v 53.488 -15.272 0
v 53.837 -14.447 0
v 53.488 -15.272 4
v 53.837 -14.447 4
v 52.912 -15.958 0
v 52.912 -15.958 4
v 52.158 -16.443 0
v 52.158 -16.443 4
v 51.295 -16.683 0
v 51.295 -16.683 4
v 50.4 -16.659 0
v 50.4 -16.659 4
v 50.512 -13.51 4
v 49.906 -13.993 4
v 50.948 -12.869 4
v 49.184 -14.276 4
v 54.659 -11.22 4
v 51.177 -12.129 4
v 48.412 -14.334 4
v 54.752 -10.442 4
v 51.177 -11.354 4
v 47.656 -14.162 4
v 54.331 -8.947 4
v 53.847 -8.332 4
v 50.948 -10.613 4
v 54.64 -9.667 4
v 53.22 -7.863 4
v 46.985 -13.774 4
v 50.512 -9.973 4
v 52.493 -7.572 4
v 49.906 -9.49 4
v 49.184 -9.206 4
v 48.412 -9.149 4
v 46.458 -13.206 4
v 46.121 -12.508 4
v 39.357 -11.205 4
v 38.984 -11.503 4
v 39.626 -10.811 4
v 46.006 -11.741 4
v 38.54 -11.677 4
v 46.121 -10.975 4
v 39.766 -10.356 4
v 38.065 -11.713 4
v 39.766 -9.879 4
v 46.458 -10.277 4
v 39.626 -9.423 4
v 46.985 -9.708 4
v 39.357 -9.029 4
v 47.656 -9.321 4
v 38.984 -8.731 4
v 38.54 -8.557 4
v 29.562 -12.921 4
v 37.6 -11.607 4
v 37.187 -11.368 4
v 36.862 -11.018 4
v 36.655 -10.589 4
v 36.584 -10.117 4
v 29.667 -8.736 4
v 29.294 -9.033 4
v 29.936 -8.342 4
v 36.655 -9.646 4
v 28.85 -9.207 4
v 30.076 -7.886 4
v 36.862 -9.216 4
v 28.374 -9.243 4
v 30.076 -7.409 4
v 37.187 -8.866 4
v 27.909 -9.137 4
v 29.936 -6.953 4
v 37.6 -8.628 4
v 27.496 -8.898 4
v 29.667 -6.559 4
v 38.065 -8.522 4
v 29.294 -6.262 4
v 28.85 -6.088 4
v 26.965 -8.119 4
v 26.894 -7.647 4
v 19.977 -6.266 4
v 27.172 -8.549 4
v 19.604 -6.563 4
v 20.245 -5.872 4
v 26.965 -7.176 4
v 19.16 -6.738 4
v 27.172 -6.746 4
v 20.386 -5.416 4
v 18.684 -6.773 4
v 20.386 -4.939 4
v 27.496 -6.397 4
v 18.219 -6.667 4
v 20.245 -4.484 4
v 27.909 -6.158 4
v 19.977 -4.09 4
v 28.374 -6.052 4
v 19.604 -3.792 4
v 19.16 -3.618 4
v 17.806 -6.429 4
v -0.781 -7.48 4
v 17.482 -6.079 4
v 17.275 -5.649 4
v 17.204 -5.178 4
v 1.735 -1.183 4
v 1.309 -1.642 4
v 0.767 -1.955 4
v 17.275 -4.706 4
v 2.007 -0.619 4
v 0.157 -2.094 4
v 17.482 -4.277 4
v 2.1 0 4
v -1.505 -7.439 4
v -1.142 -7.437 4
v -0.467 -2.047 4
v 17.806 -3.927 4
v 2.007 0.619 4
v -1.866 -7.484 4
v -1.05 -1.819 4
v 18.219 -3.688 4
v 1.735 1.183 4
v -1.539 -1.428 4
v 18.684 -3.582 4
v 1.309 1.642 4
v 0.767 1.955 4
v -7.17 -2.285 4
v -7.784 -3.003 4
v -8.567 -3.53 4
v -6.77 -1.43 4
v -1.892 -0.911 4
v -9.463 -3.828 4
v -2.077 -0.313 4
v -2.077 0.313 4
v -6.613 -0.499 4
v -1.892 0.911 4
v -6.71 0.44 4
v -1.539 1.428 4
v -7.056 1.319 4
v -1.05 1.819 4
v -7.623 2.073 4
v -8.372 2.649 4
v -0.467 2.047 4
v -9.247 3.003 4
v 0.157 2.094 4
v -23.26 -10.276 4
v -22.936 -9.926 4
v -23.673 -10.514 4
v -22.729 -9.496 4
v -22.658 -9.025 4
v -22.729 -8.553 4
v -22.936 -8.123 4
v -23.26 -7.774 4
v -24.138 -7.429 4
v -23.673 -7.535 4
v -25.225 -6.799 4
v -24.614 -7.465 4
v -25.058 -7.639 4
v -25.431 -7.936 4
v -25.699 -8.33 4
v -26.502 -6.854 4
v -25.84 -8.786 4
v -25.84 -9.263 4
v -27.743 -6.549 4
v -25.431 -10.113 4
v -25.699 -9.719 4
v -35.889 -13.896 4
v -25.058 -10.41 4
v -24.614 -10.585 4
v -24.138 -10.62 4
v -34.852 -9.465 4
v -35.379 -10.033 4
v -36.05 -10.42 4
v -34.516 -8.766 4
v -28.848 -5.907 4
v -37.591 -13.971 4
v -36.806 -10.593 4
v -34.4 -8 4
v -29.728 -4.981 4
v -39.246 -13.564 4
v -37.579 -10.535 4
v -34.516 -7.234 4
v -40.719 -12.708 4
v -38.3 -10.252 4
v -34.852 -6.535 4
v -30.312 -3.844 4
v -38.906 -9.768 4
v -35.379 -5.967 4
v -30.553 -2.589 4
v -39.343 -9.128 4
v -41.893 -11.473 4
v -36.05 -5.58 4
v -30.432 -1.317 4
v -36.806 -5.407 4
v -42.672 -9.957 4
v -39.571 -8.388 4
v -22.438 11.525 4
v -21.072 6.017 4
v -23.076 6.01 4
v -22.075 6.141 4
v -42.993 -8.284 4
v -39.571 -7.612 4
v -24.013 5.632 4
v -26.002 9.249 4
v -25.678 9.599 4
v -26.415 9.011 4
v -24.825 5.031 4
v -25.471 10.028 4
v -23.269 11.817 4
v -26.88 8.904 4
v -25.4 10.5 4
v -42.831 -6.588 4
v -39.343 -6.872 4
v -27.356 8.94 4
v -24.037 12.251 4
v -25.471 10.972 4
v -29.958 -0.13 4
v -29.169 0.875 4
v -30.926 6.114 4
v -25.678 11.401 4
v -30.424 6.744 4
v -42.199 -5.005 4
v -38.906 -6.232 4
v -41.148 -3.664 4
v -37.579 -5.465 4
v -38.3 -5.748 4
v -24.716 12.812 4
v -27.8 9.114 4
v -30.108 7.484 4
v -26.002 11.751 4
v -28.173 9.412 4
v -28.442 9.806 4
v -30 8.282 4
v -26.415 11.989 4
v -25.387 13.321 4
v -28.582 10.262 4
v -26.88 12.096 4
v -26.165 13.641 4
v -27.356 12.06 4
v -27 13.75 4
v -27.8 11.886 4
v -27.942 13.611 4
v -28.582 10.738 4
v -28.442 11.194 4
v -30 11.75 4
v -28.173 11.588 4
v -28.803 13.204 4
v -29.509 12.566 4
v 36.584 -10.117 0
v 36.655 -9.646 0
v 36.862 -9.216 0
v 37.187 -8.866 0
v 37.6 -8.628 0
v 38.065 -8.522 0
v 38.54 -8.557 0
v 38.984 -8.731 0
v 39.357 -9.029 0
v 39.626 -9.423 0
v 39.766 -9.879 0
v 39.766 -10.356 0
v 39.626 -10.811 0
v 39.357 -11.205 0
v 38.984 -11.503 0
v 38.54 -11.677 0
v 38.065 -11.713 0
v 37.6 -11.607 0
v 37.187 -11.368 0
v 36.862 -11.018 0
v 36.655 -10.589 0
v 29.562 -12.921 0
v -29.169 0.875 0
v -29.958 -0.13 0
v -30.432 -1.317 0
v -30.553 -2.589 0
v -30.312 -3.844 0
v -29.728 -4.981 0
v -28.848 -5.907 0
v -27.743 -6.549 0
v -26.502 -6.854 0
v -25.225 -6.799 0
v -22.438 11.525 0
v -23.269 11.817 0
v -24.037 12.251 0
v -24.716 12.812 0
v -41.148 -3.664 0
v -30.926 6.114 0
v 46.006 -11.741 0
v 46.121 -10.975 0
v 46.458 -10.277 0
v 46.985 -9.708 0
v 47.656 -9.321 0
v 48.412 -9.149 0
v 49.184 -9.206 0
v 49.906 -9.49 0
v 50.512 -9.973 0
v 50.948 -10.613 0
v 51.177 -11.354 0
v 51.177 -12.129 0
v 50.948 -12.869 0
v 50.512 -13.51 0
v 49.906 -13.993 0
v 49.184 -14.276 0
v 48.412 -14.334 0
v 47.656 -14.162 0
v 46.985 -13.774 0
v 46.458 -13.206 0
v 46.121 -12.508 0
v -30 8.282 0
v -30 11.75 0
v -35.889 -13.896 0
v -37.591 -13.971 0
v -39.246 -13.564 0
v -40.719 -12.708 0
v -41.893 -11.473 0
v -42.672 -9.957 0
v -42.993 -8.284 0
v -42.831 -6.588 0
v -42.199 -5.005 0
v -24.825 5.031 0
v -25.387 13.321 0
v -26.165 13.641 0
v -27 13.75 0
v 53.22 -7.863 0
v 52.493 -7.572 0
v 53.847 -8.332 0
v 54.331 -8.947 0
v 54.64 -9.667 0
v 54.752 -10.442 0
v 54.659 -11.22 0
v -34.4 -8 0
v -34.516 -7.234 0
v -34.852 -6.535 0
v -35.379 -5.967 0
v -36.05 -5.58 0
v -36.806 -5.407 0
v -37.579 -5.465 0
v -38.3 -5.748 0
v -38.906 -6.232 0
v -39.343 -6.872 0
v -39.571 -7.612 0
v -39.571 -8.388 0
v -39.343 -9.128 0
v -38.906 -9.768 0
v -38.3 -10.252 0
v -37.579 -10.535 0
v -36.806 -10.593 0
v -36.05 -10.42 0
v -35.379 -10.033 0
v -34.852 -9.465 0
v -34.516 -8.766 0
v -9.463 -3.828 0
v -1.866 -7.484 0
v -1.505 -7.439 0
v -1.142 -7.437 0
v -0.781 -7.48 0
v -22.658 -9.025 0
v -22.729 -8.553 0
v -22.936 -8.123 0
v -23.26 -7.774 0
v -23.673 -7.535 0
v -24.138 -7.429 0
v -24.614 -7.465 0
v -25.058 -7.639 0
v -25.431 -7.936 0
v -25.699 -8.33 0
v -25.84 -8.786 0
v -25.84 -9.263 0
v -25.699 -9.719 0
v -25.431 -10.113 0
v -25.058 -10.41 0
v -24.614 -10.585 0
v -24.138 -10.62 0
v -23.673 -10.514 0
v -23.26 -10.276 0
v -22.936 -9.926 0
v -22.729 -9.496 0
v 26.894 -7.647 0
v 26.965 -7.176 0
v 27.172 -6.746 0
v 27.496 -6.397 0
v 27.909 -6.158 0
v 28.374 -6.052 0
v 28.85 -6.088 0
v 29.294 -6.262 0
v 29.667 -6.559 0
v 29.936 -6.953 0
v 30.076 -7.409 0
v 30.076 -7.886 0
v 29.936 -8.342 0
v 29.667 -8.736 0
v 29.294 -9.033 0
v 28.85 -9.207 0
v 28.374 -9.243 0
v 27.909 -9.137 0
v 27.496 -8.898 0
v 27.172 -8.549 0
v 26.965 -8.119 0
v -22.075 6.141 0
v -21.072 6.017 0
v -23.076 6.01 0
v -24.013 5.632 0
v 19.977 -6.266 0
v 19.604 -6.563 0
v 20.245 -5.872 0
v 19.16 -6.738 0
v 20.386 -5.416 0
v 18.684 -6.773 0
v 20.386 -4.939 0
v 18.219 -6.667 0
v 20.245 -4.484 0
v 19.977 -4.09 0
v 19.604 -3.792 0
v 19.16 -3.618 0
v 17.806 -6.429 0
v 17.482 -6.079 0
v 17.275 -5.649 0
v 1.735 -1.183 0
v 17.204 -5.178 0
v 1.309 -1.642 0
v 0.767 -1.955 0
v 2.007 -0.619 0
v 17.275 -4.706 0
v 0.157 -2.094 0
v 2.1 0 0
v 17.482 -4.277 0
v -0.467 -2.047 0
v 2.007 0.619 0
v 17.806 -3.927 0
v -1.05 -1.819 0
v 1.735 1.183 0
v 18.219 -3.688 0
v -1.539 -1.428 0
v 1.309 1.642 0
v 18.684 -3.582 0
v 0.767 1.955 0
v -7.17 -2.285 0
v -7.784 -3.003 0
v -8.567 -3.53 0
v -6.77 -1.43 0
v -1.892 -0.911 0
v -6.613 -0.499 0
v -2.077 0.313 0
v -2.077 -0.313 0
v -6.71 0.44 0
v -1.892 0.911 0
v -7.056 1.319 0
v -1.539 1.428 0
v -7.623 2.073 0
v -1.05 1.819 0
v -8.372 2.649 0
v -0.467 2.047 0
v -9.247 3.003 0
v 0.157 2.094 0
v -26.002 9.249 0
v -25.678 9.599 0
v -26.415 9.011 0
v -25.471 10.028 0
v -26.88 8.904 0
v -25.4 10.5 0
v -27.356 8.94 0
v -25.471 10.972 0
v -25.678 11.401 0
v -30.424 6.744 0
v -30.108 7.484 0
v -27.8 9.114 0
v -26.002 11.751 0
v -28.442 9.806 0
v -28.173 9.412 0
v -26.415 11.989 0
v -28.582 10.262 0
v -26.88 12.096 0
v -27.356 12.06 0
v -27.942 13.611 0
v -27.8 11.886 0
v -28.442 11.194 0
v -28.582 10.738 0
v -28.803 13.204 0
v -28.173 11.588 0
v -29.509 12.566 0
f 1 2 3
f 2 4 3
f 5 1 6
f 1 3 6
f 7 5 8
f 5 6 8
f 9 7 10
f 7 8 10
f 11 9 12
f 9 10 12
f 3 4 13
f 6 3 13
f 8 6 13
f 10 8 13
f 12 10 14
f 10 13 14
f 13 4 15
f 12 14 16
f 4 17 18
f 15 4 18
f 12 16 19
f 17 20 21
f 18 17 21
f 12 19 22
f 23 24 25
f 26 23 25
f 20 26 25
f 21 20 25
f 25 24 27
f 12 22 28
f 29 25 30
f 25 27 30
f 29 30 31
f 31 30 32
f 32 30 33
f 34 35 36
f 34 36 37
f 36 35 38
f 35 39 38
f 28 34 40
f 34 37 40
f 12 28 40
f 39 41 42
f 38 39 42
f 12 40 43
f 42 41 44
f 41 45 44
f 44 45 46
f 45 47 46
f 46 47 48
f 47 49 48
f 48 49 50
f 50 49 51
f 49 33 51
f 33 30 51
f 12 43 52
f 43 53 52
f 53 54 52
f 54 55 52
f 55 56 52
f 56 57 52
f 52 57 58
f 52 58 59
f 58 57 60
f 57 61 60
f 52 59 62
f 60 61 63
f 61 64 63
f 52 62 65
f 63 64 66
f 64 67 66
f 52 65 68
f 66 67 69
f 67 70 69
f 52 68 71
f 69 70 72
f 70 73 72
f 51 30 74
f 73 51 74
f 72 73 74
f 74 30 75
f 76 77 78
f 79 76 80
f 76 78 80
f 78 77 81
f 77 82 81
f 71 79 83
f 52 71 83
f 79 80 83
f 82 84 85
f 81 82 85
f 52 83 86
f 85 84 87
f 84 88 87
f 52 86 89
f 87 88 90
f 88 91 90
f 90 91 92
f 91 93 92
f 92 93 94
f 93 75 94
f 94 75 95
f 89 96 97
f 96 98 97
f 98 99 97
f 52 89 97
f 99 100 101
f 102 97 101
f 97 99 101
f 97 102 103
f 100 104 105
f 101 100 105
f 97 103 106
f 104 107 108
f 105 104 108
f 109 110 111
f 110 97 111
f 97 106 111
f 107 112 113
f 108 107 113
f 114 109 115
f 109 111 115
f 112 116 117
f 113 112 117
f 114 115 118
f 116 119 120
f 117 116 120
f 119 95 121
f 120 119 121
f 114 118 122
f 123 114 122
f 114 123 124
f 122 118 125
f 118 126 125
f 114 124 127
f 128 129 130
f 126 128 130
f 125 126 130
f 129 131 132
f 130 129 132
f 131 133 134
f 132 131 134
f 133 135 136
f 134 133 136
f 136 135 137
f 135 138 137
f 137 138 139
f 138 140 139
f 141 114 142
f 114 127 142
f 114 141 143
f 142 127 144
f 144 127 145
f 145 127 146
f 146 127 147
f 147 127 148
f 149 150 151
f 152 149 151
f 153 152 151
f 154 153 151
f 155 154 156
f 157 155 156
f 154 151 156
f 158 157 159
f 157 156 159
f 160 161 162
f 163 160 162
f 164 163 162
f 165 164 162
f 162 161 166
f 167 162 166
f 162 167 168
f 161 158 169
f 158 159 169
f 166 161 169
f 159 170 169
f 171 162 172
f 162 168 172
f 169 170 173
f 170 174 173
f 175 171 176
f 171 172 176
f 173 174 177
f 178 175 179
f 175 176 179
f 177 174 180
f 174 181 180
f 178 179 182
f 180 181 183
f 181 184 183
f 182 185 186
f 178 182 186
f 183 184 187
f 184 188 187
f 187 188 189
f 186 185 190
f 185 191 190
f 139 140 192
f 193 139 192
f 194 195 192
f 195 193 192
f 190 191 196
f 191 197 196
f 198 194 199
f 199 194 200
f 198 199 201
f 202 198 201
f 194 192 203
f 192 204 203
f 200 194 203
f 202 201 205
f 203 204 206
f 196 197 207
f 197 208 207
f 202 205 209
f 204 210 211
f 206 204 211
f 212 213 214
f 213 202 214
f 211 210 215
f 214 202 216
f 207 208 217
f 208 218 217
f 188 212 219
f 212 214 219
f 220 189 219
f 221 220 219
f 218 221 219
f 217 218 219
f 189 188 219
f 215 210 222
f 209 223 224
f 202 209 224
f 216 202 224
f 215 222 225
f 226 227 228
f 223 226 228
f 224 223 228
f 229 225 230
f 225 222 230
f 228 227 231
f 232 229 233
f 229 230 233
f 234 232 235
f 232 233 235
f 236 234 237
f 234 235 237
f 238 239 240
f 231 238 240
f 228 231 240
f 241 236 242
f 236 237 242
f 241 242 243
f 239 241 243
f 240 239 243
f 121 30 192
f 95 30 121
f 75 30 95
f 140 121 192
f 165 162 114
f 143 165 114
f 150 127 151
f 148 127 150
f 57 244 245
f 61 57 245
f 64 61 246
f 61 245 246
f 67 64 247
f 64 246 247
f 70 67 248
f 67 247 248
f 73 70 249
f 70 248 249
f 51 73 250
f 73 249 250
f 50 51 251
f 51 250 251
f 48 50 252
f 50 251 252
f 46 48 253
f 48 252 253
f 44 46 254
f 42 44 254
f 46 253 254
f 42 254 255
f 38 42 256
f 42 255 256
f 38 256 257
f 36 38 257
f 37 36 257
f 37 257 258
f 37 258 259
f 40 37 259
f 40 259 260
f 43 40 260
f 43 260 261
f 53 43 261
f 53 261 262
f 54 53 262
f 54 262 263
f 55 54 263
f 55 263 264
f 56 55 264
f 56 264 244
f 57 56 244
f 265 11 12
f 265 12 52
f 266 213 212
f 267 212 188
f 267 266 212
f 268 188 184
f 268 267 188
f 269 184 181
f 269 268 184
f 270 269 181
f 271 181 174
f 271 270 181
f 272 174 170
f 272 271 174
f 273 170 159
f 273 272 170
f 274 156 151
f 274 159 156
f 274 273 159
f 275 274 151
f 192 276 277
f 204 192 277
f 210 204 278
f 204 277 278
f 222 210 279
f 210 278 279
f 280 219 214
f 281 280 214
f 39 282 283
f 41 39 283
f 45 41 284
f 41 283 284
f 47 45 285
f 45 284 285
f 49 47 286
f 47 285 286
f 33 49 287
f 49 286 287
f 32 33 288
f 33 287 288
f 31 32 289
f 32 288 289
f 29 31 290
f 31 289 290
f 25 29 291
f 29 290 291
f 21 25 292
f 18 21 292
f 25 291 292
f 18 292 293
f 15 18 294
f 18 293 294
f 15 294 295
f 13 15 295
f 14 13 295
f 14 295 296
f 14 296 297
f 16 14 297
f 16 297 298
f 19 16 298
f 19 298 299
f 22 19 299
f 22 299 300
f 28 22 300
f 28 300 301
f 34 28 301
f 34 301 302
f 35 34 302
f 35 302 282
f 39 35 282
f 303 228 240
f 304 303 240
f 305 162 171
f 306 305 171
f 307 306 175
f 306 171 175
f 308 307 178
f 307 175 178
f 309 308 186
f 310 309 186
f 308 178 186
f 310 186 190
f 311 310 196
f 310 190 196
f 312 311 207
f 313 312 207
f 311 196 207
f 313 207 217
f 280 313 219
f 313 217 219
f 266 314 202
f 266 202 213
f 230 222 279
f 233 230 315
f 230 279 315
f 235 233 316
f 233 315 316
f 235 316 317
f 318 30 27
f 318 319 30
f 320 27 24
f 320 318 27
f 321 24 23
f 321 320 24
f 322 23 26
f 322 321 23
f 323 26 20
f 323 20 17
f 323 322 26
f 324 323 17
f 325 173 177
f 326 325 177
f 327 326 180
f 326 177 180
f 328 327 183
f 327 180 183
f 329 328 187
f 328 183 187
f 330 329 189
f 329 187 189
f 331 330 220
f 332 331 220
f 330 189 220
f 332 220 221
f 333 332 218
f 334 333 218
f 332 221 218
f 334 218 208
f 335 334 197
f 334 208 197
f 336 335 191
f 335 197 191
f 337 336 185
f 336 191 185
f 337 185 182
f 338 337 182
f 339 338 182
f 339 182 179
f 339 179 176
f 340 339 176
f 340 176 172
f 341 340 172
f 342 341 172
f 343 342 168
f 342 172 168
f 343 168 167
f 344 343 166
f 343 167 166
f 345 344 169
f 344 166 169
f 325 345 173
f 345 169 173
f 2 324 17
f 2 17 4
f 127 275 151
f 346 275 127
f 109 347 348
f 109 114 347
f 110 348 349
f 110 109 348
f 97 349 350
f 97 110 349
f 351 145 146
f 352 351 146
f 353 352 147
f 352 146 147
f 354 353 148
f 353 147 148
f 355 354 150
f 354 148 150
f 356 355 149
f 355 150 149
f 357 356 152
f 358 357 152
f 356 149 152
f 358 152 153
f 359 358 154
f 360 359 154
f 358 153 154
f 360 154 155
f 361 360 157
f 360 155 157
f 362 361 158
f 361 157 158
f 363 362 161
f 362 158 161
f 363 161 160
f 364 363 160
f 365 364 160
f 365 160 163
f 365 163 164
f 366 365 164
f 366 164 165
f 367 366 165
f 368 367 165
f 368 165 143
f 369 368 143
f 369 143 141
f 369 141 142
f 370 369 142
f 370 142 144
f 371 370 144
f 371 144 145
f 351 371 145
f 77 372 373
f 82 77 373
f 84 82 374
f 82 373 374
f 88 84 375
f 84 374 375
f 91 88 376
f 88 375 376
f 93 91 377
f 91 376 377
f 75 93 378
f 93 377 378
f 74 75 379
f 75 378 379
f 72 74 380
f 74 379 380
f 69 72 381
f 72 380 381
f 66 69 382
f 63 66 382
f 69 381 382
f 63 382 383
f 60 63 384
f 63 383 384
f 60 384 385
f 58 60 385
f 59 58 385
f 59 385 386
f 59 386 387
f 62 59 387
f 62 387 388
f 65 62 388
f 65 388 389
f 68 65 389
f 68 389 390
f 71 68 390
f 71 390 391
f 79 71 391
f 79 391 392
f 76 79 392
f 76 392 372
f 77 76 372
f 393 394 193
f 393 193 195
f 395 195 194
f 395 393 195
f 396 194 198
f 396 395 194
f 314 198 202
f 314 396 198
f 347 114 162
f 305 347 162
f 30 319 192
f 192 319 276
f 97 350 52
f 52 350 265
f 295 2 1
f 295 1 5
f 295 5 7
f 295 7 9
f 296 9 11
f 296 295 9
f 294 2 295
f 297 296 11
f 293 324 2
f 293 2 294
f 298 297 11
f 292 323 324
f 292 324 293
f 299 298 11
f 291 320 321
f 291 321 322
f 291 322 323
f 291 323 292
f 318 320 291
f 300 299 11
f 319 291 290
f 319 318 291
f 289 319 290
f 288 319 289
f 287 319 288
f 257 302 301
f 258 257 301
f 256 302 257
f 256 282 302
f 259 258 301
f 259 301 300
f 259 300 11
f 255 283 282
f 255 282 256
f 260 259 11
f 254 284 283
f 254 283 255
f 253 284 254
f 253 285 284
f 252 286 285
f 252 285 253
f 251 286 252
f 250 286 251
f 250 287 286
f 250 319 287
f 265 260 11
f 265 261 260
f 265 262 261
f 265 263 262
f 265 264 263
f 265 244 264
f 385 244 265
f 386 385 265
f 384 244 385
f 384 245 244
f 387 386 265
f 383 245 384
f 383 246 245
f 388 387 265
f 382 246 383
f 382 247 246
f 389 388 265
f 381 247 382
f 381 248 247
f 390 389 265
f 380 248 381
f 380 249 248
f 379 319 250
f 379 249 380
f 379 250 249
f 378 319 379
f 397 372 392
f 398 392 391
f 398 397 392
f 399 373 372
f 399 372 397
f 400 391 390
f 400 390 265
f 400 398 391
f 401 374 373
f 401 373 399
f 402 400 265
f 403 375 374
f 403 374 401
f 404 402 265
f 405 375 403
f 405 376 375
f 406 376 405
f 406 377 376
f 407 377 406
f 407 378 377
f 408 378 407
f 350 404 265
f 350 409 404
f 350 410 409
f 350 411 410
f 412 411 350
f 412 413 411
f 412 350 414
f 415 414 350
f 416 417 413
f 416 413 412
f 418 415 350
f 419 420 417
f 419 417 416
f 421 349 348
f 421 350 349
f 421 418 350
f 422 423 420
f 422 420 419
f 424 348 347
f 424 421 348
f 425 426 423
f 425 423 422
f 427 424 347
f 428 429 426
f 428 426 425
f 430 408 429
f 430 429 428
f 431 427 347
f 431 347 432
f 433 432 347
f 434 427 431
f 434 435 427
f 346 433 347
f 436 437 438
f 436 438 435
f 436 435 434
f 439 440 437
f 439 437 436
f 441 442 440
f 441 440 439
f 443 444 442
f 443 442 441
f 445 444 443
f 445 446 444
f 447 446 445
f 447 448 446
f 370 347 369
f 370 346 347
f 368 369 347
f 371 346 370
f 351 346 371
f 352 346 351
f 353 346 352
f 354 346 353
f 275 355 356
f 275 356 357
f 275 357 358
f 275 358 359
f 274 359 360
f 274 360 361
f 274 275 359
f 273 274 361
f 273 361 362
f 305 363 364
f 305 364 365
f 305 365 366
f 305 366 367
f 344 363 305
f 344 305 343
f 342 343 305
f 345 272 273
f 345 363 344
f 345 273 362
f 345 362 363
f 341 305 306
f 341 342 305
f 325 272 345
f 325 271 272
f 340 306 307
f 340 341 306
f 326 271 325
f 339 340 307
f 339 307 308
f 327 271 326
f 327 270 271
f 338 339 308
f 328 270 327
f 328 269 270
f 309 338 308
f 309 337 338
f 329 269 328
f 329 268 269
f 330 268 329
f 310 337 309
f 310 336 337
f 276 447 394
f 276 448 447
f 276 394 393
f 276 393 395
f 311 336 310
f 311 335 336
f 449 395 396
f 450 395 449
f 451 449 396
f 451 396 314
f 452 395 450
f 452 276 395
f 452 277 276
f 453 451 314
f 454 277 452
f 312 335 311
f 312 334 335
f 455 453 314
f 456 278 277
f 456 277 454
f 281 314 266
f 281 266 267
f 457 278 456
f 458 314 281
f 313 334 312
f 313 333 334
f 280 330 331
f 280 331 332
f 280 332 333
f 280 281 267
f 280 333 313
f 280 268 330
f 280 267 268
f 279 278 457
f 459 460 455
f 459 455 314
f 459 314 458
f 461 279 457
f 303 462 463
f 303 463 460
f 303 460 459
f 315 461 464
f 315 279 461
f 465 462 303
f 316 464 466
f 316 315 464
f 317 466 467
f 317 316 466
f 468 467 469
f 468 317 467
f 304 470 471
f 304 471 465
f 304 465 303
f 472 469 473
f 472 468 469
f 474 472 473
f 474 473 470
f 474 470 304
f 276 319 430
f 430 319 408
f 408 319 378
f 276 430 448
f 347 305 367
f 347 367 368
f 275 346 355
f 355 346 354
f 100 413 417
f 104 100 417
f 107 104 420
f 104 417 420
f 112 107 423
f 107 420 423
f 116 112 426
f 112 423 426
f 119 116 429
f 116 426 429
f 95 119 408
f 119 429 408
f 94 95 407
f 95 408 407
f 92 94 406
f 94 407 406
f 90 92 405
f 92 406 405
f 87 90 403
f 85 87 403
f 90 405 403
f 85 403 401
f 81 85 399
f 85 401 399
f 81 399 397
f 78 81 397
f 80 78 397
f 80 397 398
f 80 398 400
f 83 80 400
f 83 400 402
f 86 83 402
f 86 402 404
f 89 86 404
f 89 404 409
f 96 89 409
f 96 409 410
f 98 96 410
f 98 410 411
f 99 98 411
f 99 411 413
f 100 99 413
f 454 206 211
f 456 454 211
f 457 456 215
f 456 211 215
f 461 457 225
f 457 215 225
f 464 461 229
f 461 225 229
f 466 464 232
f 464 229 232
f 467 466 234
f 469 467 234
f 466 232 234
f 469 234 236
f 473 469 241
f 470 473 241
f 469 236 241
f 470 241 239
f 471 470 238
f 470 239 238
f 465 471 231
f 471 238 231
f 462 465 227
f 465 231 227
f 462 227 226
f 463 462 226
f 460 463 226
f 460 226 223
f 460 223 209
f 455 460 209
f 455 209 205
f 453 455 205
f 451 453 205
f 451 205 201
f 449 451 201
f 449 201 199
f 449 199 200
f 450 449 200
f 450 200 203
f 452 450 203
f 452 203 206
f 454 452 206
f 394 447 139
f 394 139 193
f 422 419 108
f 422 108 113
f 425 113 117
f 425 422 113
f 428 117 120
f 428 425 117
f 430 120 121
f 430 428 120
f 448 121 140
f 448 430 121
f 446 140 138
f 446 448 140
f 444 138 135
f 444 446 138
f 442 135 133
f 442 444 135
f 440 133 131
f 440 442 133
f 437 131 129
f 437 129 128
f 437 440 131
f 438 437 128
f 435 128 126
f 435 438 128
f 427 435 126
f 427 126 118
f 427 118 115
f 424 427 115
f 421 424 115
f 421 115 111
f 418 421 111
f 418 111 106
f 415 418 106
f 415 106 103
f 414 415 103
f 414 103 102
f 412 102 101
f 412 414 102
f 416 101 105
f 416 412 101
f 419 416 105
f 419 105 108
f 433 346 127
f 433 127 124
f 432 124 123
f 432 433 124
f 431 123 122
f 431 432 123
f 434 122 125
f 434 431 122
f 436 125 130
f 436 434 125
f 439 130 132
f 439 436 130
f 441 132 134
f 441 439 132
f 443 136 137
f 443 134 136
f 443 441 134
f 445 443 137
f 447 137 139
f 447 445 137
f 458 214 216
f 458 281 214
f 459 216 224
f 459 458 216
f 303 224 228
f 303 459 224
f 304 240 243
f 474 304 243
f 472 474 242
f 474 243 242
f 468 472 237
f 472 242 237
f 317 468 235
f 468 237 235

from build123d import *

# Parameters (mm, degrees)
SKETCH_1_R          = 2.1
EXTRUDE_1_DEPTH     = 4
FILLET_3_R          = 5
CUT_EXTRUDE_1_DEPTH = 48.602520942
SKETCH_5_R          = 1.6
CUT_EXTRUDE_4_DEPTH = 45.060309279
SKETCH_6_R          = 2.6
EXTRUDE_3_DEPTH     = 4
FILLET_4_R          = 3
EXTRUDE_6_DEPTH     = 4
SKETCH_8_R          = 1.6
CUT_EXTRUDE_5_DEPTH = 59.484887667
CUT_EXTRUDE_6_DEPTH = 59.484887667
SKETCH_10_R         = 1.6
EXTRUDE_5_DEPTH     = 4
CUT_EXTRUDE_7_DEPTH = 59.131742072
FILLET_5_R          = 3
SKETCH_13_R         = 2.6
CUT_EXTRUDE_8_DEPTH = 10
SKETCH_14_R         = 1.6
CUT_EXTRUDE_9_DEPTH = 10


with BuildPart() as part:
    # 草图1 → 凸台-拉伸1 (new body)
    with BuildSketch(Plane.XY):
        with BuildLine():
            Line((-30, 15), (-30, 8))
            Line((-30, 8), (-3.625760775, -6.565352908))
            ThreePointArc((-3.625760775, -6.565352908), (-2.508336586, -7.068114853), (-1.323960706, -7.382217014))
            Line((-1.323960706, -7.382217014), (30, -13))
            Line((30, -13), (40, -13))
            ThreePointArc((40, -13), (44.961129361, -8.622250323), (41.234825739, -3.154878186))
            Line((41.234825739, -3.154878186), (-8.89090638, 9.620145142))
            Line((-8.89090638, 9.620145142), (-30, 15))
        make_face()
        Circle(SKETCH_1_R, mode=Mode.SUBTRACT)
    extrude(amount=EXTRUDE_1_DEPTH)

    # 圆角3
    fillet_3_edges = [part.edges().sort_by_distance(p)[0] for p in [
        (30, -13, 2),
    ]]
    fillet(fillet_3_edges, radius=FILLET_3_R)

    # 草图2 → 切除-拉伸1 (cut, through all)
    with BuildSketch(Plane.XY.offset(4)):
        Polygon((41.234825739, -3.154878186), (38.343573198, -14.499370217), (44.079449635, -18.425378343), (50.650422799, -6.675561263), (42.473370603, -0.777871599), align=None)
    extrude(amount=-CUT_EXTRUDE_1_DEPTH, mode=Mode.SUBTRACT)

    # 草图5 → 切除-拉伸4 (cut, through all)
    with BuildSketch(Plane.XY.offset(4)):
        with Locations((-27, 10.5)):
            Circle(SKETCH_5_R)
        with BuildLine():
            Line((-27, 13.75), (-27.802461724, 17.848471623))
            Line((-27.802461724, 17.848471623), (-34.200130402, 16.595837785))
            Line((-34.200130402, 16.595837785), (-34.200130402, 10.5))
            Line((-34.200130402, 10.5), (-30.25, 10.5))
            ThreePointArc((-30.25, 10.5), (-29.298097039, 12.798097039), (-27, 13.75))
        make_face()
    extrude(amount=-CUT_EXTRUDE_4_DEPTH, mode=Mode.SUBTRACT)

    # 草图6 → 凸台-拉伸3 (add)
    with BuildSketch(Plane.XY.offset(4)):
        with BuildLine():
            Line((-1.323960706, -7.382217014), (-35.888817872, -13.896208466))
            ThreePointArc((-35.888817872, -13.896208466), (-42.336413013, -10.742753389), (-41.147636408, -3.664436343))
            Line((-41.147636408, -3.664436343), (-30, 7))
            Line((-30, 7), (-30, 8))
            Line((-30, 8), (-1.323960706, -7.382217014))
        make_face()
        with Locations((-37, -8)):
            Circle(SKETCH_6_R, mode=Mode.SUBTRACT)
    extrude(amount=-EXTRUDE_3_DEPTH)

    # 圆角4
    fillet_4_edges = [part.edges().sort_by_distance(p)[0] for p in [
        (41.234825739, -3.154878186, 2),
        (-1.323960706, -7.382217014, 2),
        (38.725702071, -13, 2),
        (-30, 7, 2),
    ]]
    fillet(fillet_4_edges, radius=FILLET_4_R)

    # 草图12 → 凸台-拉伸6 (add, through all)
    with BuildSketch(Plane(origin=(0, 0, 0), x_dir=(-1, 0, 0), z_dir=(0, 0, -1))):
        Polygon((-38.32775265, -2.413982742), (-55.770191182, -6.859355403), (-53.147184729, -17.151322425), (-28.912835061, -12.805022846), align=None)
    extrude(amount=-EXTRUDE_6_DEPTH)

    # 草图8 → 切除-拉伸5 (cut, through all)
    with BuildSketch(Plane(origin=(0, 0, 0), x_dir=(-1, 0, 0), z_dir=(0, 0, -1))):
        with Locations((-18.803711615, -5.177837216)):
            Circle(SKETCH_8_R)
        with Locations((-28.493955243, -7.647488694)):
            Circle(SKETCH_8_R)
        with Locations((-38.184198872, -10.117140172)):
            Circle(SKETCH_8_R)
    extrude(amount=-CUT_EXTRUDE_5_DEPTH, mode=Mode.SUBTRACT)

    # 草图9 → 切除-拉伸6 (cut, through all)
    with BuildSketch(Plane(origin=(0, 0, 0), x_dir=(-1, 0, 0), z_dir=(0, 0, -1))):
        with BuildLine():
            Line((30, 11.75), (30, 25.879948008))
            Line((30, 25.879948008), (-59.978637955, 25.879948008))
            Line((-59.978637955, 25.879948008), (-59.978637955, -9.479867102))
            Line((-59.978637955, -9.479867102), (22.437617221, 11.52470556))
            ThreePointArc((22.437617221, 11.52470556), (23.662682687, 12.016789899), (24.71625119, 12.812356238))
            ThreePointArc((24.71625119, 12.812356238), (27.640627923, 13.686235375), (30, 11.75))
        make_face()
    extrude(amount=-CUT_EXTRUDE_6_DEPTH, mode=Mode.SUBTRACT)

    # 草图10 → 凸台-拉伸5 (add, through all)
    with BuildSketch(Plane(origin=(0, 0, 0), x_dir=(-1, 0, 0), z_dir=(0, 0, -1))):
        with BuildLine():
            Line((30, 11.75), (30, 9.25))
            ThreePointArc((30, 9.25), (23.75, 10.5), (30, 11.75))
        make_face()
        with Locations(Location((27, 10.5, 0), (0, 0, 180))):
            Circle(SKETCH_10_R, mode=Mode.SUBTRACT)
    extrude(amount=-EXTRUDE_5_DEPTH)

    # 草图11 → 切除-拉伸7 (cut, through all)
    with BuildSketch(Plane(origin=(0, 0, 0), x_dir=(-1, 0, 0), z_dir=(0, 0, -1))):
        with BuildLine():
            Line((24.825037002, 5.031136033), (29.169175717, 0.875296258))
            ThreePointArc((29.169175717, 0.875296258), (30.06075817, -4.433441527), (25.225061815, -6.798532835))
            Line((25.225061815, -6.798532835), (9.462787836, -3.82802098))
            ThreePointArc((9.462787836, -3.82802098), (6.612728883, -0.499278448), (9.246599393, 3.003019229))
            Line((9.246599393, 3.003019229), (21.072085472, 6.016857713))
            ThreePointArc((21.072085472, 6.016857713), (23.076090116, 6.009539302), (24.825037002, 5.031136033))
        make_face()
    extrude(amount=-CUT_EXTRUDE_7_DEPTH, mode=Mode.SUBTRACT)

    # 圆角5
    fillet_5_edges = [part.edges().sort_by_distance(p)[0] for p in [
        (53.147184729, -17.151322425, 2),
        (55.39974346, -8.312891947, 2),
    ]]
    fillet(fillet_5_edges, radius=FILLET_5_R)

    # 草图13 → 切除-拉伸8 (cut)
    with BuildSketch(Plane(origin=(0, 0, 0), x_dir=(-1, 0, 0), z_dir=(0, 0, -1))):
        with Locations((-48.605919829, -11.741249861)):
            Circle(SKETCH_13_R)
    extrude(amount=-CUT_EXTRUDE_8_DEPTH, mode=Mode.SUBTRACT)

    # 草图14 → 切除-拉伸9 (cut)
    with BuildSketch(Plane.XY.offset(4)):
        with Locations((-24.257929074, -9.024692947)):
            Circle(SKETCH_14_R)
    extrude(amount=-CUT_EXTRUDE_9_DEPTH, mode=Mode.SUBTRACT)


solid = part.part
